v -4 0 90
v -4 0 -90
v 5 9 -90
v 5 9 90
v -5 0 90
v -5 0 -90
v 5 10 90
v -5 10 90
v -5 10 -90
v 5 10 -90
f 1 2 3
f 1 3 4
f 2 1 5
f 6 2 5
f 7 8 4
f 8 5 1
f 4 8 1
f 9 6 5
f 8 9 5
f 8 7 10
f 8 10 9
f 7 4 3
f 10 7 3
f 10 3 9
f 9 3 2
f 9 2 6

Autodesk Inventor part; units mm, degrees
ref_plane "YZ Plane" through (0, 0, 0) normal (1, 0, 0) x (0, 1, 0)
ref_plane "XZ Plane" through (0, 0, 0) normal (0, 1, 0) x (-1, 0, 0)
ref_plane "XY Plane" through (0, 0, 0) normal (0, 0, 1) x (1, 0, 0)
sketch "Sketch1" plane through (0, 0, 0) normal (0, 1, 0) x (-1, 0, 0)
  line L0 (5, 90) -> (-5, 90)
  line L1 (-5, 90) -> (-5, -90)
  line L2 (-5, -90) -> (5, -90)
  line L3 (5, -90) -> (5, 90)
  line L4 (5, 90) -> (-5, -90) construction
  line L5 (-5, 90) -> (5, -90) construction
  point P0 (0, 0)
  dimension "d0" = 10
  dimension "d1" = 180
extrude "Extrusion1" add sketch "Sketch1" along normal blind 10
chamfer "Chamfer1" distance 9 angle 45 1 edges at (5, 0, 0)
equation "\"BendRadius\" = Thickness"
equation "\"BendReliefWidth\" = Thickness"
equation "\"BendReliefDepth\" = 0.5 * Thickness"
equation "\"CornerReliefSize\" = 4 * Thickness"
equation "\"MinimumRemnant\" = 2 * Thickness"
equation "\"TransitionRadius\" = BendRadius"
equation "\"JacobiRadiusSize\" = BendRadius"
equation "\"GapSize\" = Thickness"
equation "\"Thickness\" = 0.5"
properties part number "rovny_diel_180"
